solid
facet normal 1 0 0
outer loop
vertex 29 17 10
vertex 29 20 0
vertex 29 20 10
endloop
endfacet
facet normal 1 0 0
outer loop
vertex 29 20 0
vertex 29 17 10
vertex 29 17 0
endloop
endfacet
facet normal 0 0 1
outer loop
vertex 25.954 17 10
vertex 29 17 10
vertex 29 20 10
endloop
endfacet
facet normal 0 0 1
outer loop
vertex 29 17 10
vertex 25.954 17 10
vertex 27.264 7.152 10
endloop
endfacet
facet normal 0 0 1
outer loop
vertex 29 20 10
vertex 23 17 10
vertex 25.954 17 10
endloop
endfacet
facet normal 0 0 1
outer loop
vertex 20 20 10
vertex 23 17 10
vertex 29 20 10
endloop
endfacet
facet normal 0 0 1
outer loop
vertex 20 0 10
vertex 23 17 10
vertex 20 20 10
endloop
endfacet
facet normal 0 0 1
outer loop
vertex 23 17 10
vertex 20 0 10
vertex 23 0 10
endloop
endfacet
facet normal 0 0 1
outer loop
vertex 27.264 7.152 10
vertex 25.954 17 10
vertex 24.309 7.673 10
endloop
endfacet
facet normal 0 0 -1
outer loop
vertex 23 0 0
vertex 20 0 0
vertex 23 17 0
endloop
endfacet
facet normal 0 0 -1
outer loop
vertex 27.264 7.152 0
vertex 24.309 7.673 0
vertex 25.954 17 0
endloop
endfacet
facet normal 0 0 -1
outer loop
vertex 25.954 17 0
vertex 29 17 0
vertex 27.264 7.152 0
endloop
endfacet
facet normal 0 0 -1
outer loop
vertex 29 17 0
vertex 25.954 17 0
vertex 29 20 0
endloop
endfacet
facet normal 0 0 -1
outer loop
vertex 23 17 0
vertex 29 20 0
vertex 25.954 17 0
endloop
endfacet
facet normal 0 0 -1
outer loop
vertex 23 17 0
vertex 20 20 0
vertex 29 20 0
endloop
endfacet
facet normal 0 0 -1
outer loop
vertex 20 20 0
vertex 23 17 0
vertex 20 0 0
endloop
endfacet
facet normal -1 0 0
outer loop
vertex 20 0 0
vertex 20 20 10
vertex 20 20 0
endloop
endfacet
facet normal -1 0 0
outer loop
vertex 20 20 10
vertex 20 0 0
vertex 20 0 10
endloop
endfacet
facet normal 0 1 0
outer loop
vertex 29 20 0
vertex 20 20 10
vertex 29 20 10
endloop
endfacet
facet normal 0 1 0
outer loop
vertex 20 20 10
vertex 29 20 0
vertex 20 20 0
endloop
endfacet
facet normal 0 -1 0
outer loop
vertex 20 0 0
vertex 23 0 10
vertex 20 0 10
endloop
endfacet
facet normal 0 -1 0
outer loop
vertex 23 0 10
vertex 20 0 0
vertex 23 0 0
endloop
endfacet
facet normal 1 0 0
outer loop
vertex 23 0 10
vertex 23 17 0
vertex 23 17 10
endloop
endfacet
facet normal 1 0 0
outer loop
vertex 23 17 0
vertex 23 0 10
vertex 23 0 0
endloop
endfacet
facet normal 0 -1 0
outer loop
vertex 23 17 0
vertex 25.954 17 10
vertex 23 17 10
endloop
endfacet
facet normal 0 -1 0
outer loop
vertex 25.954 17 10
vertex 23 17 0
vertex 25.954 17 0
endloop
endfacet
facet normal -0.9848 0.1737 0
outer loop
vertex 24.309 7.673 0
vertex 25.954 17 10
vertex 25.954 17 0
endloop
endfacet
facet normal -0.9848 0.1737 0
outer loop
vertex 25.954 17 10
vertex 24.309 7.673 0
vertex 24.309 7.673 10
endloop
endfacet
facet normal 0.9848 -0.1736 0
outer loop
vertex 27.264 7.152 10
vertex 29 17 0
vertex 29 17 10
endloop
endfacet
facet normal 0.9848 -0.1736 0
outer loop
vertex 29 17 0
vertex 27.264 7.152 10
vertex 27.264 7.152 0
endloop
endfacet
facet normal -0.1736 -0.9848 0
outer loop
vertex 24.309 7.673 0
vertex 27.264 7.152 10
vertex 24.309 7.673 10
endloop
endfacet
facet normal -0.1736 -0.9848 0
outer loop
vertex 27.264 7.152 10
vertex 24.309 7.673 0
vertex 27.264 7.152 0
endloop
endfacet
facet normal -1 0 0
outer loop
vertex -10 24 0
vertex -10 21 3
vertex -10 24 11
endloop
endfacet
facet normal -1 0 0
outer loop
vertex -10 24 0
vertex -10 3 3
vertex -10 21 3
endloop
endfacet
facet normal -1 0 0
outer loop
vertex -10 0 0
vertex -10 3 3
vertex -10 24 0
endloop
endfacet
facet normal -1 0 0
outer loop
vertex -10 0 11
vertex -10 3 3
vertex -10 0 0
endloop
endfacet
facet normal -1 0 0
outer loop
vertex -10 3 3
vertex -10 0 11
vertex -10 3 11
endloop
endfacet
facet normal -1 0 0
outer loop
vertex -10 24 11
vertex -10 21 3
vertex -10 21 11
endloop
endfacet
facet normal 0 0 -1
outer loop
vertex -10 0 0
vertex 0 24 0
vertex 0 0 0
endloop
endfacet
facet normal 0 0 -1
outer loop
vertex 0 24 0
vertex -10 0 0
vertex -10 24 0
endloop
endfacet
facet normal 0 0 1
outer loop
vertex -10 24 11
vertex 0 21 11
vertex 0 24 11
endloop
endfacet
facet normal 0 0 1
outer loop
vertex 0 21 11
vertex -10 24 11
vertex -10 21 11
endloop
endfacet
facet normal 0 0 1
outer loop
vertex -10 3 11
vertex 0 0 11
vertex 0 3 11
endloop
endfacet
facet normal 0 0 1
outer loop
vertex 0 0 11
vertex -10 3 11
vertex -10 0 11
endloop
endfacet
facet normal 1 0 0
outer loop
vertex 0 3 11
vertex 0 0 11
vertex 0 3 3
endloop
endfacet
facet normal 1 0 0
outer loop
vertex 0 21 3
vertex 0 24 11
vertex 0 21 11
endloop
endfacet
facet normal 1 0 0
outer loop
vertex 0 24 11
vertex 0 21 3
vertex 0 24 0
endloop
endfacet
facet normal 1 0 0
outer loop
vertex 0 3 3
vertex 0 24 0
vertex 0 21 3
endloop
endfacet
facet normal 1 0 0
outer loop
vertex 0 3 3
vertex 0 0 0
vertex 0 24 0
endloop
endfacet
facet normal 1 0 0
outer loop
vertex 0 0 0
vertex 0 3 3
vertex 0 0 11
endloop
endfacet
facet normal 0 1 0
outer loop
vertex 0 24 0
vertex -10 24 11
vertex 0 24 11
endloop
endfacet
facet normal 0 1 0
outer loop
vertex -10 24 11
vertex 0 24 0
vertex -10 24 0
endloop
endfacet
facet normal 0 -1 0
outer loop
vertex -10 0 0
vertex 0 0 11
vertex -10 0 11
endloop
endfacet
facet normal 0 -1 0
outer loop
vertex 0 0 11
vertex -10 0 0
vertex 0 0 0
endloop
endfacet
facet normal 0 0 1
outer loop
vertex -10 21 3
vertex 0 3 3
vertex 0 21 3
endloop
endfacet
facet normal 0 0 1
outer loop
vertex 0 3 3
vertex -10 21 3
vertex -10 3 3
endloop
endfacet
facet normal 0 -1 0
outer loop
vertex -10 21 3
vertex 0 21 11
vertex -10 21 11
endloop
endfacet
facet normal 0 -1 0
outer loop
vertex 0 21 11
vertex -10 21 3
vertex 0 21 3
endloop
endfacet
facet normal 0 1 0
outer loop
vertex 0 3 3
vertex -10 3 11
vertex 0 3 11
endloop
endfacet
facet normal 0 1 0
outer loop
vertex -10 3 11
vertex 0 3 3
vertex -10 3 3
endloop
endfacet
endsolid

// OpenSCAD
// file: Spool_mount_for_i3_config.scad
//
//
//Variables

width=8;
length_frame_mount=40;
length_strip=120;
length_axis_support=15;
height=18;

//Liston de enlace
height_clamp=width/3;

//enganche
module anchor(){
	translate([height/2,0,width/2]) rotate([90,0,0]) 
	union(){
		cylinder(r=height/8, h=height_clamp, $fn=30);
		translate([0,0,height_clamp/2])
			cube([height/8,width,height_clamp],center=true);
	}
}
// main file
include<Spool_mount_for_i3_config.scad>

module enganche1(){
	difference(){
		cube([9,20,10]);
		translate([3,-3,-1])
			cube([9,20,12]);
	}

	translate([9,17,0])
		rotate([0,0,170])
			cube([3,10,10]);
}

module enganche2(){
	translate([0,0,width+3])
	rotate([0,180,0])
		difference(){
			cube([10,height+6,width+3]);
			translate([-1,3,-1])
				cube([12,height,width+1]);
		}
}

translate([20,0,0]) enganche1();

enganche2();
